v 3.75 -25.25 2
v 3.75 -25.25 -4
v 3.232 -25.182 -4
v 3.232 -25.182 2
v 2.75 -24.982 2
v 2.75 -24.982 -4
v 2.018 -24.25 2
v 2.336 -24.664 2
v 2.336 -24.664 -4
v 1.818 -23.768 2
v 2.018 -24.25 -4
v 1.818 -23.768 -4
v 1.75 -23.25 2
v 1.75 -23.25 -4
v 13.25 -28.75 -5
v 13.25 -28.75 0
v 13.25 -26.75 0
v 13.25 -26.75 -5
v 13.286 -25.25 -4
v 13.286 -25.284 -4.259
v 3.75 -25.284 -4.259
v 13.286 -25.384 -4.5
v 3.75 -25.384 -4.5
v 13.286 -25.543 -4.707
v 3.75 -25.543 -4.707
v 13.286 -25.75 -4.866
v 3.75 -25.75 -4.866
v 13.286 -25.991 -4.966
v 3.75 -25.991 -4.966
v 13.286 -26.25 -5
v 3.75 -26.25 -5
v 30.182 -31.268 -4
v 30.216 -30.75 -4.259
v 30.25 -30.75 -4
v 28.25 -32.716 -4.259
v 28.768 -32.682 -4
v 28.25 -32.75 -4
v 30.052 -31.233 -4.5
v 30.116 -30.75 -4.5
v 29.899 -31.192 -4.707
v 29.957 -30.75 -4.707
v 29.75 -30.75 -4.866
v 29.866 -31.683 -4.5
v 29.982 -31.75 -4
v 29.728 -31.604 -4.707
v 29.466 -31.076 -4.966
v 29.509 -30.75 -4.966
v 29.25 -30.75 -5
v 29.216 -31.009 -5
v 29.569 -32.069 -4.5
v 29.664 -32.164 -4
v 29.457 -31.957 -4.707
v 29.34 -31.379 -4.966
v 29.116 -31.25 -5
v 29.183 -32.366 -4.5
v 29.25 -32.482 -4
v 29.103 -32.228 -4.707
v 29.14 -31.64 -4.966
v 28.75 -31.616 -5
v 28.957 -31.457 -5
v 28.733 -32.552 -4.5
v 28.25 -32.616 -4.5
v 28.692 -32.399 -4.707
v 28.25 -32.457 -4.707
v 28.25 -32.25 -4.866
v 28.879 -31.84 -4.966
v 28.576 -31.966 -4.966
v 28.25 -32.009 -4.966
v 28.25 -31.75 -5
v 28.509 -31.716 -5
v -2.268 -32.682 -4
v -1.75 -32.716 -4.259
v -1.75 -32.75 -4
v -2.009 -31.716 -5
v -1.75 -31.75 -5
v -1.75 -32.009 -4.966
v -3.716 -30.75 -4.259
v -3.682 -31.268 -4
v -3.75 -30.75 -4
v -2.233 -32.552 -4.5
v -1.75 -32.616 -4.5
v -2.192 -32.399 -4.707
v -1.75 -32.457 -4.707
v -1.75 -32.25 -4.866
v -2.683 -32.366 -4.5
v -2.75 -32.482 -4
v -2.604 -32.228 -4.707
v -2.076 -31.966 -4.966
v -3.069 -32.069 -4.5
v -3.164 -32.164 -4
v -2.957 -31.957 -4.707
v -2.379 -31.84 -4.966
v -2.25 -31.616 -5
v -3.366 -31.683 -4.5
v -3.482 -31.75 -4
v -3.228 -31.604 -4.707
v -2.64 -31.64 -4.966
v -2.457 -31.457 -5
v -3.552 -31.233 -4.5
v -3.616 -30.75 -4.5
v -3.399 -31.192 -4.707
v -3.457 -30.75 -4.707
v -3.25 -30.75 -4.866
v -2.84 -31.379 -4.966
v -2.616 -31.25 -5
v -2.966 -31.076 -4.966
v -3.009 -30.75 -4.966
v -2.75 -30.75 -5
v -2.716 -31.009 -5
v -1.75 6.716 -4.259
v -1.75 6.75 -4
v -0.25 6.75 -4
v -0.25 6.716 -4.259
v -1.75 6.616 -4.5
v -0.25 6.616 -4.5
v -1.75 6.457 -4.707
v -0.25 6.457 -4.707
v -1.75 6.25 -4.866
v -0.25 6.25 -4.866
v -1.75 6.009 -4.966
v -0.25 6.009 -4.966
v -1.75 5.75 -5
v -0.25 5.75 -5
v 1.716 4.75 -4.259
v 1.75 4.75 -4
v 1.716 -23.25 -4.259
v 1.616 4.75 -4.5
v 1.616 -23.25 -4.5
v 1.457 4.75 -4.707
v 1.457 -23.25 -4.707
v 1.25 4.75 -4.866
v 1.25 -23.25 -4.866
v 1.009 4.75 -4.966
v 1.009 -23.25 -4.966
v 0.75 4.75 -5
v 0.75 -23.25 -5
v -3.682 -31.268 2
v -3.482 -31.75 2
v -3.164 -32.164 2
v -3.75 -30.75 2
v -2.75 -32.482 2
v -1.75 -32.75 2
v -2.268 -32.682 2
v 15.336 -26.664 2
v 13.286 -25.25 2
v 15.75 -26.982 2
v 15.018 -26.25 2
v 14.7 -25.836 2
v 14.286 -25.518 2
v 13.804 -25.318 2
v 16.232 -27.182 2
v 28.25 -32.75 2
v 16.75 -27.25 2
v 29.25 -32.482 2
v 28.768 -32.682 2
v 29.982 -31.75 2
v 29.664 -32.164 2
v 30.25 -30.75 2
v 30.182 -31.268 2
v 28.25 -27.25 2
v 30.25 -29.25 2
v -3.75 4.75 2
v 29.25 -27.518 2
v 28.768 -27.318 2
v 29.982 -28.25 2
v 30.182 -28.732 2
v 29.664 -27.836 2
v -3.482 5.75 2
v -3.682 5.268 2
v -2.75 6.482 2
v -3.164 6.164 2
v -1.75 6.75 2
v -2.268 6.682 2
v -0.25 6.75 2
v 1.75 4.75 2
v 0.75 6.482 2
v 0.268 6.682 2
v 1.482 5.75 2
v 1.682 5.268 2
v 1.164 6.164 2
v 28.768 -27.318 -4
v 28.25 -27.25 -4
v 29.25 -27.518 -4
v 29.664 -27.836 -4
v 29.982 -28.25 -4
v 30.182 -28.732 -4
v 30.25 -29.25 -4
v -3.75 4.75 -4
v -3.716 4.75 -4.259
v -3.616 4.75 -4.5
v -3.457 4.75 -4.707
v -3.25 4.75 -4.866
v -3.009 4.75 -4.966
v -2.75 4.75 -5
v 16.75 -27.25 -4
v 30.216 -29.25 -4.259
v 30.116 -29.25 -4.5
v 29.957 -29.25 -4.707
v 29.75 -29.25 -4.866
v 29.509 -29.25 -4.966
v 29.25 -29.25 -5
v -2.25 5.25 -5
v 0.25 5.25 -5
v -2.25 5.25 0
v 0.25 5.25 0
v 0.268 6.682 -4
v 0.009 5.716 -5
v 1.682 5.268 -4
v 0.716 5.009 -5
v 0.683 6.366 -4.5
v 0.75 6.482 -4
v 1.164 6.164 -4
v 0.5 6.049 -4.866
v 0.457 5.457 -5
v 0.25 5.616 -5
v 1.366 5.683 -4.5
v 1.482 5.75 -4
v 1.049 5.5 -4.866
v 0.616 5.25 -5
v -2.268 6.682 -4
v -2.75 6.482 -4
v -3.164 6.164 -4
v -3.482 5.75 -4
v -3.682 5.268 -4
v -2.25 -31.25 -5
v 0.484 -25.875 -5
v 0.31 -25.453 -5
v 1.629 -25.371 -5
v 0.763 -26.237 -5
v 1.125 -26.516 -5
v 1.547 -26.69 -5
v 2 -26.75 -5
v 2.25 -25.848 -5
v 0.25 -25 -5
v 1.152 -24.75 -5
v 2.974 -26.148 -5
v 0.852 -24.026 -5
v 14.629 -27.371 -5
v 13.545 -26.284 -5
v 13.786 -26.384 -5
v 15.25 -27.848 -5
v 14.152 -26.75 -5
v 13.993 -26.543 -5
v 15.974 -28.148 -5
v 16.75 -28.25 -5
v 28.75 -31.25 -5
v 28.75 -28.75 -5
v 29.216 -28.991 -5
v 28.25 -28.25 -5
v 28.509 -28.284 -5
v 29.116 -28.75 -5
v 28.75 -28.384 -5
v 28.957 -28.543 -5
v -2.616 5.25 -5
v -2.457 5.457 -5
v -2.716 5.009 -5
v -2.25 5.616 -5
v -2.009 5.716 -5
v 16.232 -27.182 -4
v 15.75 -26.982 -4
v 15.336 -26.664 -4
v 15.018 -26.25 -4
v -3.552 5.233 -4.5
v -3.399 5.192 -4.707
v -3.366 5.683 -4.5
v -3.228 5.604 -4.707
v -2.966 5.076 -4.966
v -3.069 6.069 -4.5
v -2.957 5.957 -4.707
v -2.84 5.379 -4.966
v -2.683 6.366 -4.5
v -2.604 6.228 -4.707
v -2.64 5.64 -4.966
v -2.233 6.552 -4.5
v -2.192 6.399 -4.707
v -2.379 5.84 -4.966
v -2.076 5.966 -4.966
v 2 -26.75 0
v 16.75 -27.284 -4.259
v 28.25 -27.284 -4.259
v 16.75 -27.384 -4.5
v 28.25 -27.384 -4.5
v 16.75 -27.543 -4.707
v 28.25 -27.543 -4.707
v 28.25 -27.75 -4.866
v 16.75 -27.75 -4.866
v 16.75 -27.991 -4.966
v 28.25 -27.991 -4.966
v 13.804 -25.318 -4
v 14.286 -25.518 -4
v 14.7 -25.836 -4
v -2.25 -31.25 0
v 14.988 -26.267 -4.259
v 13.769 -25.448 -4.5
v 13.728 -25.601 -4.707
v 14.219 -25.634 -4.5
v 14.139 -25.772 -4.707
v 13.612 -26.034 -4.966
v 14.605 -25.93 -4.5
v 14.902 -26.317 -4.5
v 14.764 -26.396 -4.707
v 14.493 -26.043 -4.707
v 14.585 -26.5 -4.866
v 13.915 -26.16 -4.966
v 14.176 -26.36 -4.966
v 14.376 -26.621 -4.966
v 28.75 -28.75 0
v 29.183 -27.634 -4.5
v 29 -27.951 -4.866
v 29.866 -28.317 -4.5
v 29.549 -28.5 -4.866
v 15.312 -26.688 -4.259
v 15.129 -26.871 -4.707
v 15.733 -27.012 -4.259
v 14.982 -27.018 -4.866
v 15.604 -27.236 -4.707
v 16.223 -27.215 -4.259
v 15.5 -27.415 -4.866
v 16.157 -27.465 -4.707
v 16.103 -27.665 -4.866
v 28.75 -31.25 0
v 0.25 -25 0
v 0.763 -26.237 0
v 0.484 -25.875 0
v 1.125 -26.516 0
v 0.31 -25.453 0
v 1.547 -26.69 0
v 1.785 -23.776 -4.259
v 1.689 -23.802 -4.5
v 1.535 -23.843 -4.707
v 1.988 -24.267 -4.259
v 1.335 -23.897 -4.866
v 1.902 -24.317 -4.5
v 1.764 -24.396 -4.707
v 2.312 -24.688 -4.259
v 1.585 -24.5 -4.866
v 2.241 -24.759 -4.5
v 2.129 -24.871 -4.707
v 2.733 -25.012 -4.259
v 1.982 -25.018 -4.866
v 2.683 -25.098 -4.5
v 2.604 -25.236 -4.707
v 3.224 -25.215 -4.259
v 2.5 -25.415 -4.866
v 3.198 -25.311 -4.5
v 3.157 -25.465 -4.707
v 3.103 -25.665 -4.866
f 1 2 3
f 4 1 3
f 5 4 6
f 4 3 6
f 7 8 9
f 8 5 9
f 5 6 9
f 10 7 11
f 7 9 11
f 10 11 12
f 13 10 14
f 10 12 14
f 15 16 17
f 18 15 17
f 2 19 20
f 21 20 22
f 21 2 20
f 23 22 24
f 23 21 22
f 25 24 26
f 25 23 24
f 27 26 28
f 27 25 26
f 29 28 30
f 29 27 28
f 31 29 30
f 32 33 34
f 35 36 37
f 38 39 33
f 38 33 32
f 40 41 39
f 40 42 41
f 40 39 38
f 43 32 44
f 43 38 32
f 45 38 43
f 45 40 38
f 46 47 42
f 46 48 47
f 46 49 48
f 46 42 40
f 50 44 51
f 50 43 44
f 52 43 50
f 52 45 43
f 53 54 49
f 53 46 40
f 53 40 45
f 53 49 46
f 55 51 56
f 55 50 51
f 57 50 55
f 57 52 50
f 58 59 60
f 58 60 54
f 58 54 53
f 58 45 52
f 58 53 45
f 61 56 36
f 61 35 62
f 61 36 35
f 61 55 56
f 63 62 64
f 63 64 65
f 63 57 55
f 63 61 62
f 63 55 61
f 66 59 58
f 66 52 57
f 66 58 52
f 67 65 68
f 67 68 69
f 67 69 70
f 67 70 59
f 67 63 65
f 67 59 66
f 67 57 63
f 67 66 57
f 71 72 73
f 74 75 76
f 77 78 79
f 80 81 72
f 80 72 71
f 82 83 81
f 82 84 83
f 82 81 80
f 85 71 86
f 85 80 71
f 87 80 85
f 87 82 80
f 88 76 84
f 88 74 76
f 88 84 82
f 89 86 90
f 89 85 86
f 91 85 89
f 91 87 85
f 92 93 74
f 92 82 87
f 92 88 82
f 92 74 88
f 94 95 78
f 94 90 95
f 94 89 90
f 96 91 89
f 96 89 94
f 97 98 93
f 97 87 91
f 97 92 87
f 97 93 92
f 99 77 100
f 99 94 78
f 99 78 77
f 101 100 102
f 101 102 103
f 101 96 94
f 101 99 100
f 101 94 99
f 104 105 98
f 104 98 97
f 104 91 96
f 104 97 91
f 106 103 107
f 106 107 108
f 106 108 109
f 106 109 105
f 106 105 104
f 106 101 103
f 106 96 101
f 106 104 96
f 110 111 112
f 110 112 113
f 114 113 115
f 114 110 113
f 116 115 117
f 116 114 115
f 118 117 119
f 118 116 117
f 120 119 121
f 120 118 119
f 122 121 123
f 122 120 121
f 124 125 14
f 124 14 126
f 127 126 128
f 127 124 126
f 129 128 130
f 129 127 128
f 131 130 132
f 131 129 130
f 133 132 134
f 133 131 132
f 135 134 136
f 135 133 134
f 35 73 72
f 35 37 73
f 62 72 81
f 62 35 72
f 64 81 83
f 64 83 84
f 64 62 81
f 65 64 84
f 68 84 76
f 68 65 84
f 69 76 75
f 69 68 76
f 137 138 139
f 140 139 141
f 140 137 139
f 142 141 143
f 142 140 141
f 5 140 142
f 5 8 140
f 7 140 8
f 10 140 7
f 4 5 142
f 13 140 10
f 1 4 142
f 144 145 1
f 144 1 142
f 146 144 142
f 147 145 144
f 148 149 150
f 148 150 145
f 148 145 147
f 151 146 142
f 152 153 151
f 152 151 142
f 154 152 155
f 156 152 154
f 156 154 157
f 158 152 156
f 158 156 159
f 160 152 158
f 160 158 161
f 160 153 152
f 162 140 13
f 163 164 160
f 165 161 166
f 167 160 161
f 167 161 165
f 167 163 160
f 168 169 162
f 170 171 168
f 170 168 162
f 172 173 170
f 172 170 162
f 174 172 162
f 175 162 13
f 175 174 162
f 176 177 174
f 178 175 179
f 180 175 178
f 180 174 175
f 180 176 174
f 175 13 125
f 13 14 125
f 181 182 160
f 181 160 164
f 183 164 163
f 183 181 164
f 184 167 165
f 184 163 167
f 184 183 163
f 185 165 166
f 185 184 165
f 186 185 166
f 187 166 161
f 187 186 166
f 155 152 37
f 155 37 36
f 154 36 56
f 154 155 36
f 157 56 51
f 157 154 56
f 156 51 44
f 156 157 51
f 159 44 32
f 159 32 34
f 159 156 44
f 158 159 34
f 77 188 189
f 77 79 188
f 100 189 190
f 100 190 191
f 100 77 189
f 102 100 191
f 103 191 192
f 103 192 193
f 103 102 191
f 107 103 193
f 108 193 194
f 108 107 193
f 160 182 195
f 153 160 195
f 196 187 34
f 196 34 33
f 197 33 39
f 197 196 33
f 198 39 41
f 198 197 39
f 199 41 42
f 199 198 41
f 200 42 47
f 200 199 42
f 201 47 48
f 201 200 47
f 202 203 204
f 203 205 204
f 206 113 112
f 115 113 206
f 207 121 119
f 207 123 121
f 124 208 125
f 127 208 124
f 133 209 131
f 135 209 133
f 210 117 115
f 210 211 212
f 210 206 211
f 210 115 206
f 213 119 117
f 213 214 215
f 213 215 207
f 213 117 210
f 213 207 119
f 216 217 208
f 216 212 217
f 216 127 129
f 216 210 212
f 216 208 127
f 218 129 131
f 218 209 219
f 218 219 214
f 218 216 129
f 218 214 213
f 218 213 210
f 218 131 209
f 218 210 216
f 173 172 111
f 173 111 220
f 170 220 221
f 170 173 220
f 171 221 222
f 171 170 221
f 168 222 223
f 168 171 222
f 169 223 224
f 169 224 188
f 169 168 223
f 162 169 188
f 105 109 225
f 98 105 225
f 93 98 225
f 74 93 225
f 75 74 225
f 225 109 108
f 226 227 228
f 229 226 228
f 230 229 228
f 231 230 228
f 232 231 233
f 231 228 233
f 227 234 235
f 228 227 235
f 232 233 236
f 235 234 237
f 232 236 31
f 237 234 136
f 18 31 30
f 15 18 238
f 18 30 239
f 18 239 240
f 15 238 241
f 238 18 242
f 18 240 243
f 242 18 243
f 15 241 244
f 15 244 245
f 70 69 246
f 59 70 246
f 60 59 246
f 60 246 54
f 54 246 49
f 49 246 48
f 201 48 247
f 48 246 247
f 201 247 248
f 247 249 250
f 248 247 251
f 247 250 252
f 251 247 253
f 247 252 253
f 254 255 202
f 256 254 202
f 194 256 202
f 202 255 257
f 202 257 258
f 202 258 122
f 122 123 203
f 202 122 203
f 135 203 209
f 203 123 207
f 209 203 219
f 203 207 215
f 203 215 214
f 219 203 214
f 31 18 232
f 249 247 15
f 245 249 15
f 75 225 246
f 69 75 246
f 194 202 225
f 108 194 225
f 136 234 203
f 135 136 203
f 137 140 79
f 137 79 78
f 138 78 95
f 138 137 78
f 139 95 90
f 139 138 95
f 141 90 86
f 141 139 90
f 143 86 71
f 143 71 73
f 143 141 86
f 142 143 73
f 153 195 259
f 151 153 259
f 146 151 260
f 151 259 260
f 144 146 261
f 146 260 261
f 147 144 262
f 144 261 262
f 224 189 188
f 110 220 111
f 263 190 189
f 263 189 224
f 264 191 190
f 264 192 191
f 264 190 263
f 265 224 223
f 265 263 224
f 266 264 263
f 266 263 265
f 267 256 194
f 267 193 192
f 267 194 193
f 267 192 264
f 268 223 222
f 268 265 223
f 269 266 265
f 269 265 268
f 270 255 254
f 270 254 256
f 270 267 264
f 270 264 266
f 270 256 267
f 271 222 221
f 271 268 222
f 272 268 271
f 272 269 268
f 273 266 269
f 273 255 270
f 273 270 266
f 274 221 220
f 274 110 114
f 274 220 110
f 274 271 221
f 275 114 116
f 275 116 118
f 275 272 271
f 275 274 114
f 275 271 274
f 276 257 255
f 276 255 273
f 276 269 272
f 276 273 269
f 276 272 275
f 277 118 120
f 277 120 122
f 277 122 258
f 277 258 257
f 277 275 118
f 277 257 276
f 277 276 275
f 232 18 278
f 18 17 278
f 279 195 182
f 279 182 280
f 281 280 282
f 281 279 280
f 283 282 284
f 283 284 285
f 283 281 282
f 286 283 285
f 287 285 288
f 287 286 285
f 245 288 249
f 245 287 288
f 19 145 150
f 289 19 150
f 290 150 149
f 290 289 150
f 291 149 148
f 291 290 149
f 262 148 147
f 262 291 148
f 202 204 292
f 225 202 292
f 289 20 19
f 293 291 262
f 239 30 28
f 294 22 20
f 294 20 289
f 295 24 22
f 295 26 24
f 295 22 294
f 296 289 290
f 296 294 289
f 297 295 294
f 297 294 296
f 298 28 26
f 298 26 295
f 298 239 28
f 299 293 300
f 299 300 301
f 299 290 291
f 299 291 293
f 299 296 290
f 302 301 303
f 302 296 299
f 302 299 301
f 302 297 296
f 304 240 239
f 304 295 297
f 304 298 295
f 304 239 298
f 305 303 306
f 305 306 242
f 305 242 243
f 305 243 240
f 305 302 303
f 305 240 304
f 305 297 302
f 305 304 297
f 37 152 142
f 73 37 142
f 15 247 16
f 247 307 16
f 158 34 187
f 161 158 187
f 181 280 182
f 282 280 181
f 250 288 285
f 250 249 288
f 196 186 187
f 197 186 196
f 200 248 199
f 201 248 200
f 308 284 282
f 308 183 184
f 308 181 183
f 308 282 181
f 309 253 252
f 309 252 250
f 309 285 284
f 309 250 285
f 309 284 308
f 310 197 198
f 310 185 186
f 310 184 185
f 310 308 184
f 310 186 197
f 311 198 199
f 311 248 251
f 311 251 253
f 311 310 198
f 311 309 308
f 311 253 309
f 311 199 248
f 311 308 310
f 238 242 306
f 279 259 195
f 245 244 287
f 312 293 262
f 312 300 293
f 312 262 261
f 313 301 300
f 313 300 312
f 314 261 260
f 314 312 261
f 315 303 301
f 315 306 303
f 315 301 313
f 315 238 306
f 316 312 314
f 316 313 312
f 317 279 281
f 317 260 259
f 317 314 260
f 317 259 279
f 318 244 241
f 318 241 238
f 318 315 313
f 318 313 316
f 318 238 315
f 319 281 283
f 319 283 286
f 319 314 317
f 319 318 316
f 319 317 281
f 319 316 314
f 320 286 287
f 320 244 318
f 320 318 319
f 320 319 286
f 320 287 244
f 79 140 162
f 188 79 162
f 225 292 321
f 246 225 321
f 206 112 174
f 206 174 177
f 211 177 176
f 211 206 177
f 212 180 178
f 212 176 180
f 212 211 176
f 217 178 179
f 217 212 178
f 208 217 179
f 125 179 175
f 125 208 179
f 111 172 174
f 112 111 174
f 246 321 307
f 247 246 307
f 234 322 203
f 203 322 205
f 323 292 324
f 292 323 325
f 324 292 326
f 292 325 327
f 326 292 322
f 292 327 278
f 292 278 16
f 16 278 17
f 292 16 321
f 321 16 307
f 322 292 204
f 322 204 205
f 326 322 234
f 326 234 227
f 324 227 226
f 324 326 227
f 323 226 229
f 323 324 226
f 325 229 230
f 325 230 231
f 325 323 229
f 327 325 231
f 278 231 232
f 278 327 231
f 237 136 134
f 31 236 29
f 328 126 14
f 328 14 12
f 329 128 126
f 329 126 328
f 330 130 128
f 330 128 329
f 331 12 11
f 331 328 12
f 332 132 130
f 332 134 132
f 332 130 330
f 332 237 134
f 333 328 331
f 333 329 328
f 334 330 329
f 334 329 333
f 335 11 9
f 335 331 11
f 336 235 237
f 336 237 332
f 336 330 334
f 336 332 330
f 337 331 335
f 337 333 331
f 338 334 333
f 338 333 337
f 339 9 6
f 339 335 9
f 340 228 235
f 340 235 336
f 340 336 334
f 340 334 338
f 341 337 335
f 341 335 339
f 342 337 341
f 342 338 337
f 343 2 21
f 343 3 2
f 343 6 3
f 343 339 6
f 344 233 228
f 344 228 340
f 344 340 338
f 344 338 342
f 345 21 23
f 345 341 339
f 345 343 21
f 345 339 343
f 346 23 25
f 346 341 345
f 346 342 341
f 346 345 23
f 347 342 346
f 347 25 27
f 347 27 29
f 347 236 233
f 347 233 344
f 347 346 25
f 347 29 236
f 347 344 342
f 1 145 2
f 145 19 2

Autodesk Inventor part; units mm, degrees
ref_plane "YZ Plane" through (0, 0, 0) normal (1, 0, 0) x (0, 1, 0)
ref_plane "XZ Plane" through (0, 0, 0) normal (0, 1, 0) x (-1, 0, 0)
ref_plane "XY Plane" through (0, 0, 0) normal (0, 0, 1) x (1, 0, 0)
sketch "Skizze1" plane through (0, 0, 0) normal (0, 0, 1) x (1, 0, 0)
  line L0 (-2, -29) -> (-2, -31) construction
  line L1 (0, -31) -> (-2, -31) construction
  line L2 (-2, -29) -> (0, -29) construction
  line L3 (0, -31) -> (26.4999, -31) construction
  line L4 (28.4999, -31) -> (26.4999, -31) construction
  line L5 (26.4999, -29) -> (28.4999, -29) construction
  line L6 (28.4999, -31) -> (28.4999, -29) construction
  line L7 (26.4999, -29) -> (0, -29) construction
  line L8 (13, -27) -> (13, -29) construction
  line L9 (13, -27) -> (2, -27) construction
  arc A0 (0, -25) -> (2, -27) centre (2, -25) ccw construction
  arc A1 (-2, -25) -> (2, -29) centre (2, -25) ccw construction
  line L10 (-2, 0) -> (-2, -25) construction
  line L11 (0, -25) -> (0, 0) construction
  line L12 (-2, 0) -> (-2, 5) construction
  line L13 (0, 5) -> (0, 0) construction
  line L14 (0, 5) -> (-2, 5) construction
  line L15 (28.4999, -31) -> (-2, -31) construction
  line L16 (-2, -31) -> (-2, 5) construction
  line L17 (-2, 5) -> (0, 5) construction
  line L18 (0, 5) -> (0, -25) construction
  arc A2 (0, -25) -> (2, -27) centre (2, -25) ccw construction
  line L19 (2, -27) -> (13, -27) construction
  line L20 (13, -27) -> (13, -29) construction
  line L21 (13, -29) -> (28.4999, -29) construction
  line L22 (28.4999, -31) -> (28.4999, -29) construction
  line L23 (-2.25, 5.25) -> (-2.25, -31.25)
  line L24 (-2.25, -31.25) -> (28.7499, -31.25)
  line L25 (28.7499, -31.25) -> (28.7499, -28.75)
  line L26 (28.7499, -28.75) -> (13.25, -28.75)
  line L27 (13.25, -28.75) -> (13.25, -26.75)
  line L28 (13.25, -26.75) -> (2, -26.75)
  arc A3 (0.25, -25) -> (2, -26.75) centre (2, -25) ccw
  line L29 (0.25, -25) -> (0.25, 5.25)
  line L30 (0.25, 5.25) -> (-2.25, 5.25)
  line L31 (-3.75, -30.75) -> (-3.75, 4.75)
  line L32 (-1.75, 6.75) -> (-0.25, 6.75)
  line L33 (1.75, 4.75) -> (1.75, -23.25)
  arc A4 (1.75, -25) -> (2, -25.25) centre (2, -25) ccw
  line L34 (3.75, -25.25) -> (13.2859, -25.25)
  line L35 (14.75, -25.25) -> (14.75, -25.25)
  line L36 (16.75, -27.25) -> (28.2499, -27.25)
  line L37 (30.2499, -29.25) -> (30.2499, -30.75)
  line L38 (28.2499, -32.75) -> (-1.75, -32.75)
  arc A5 (28.2499, -32.75) -> (30.2499, -30.75) centre (28.2499, -30.75) ccw
  arc A6 (30.2499, -29.25) -> (28.2499, -27.25) centre (28.2499, -29.25) ccw
  arc A7 (-3.75, -30.75) -> (-1.75, -32.75) centre (-1.75, -30.75) ccw
  arc A8 (15.0179, -26.25) -> (16.75, -27.25) centre (16.75, -25.25) ccw
  arc A9 (15.0179, -26.25) -> (13.2859, -25.25) centre (13.2859, -27.25) ccw
  arc A10 (1.75, -23.25) -> (3.75, -25.25) centre (3.75, -23.25) ccw
  arc A11 (1.75, 4.75) -> (-0.25, 6.75) centre (-0.25, 4.75) ccw
  arc A12 (-1.75, 6.75) -> (-3.75, 4.75) centre (-1.75, 4.75) ccw
  dimension "d0" = 0.25
  dimension "d1" = 1.5
  dimension "d2" = 2
  dimension "d3" = 2
extrude "Extrusion1" add sketch "Skizze1" against normal blind 5
fillet "Rundung1" radius 1 15 edges at (-3.1642, -32.1642, -5) (-3.75, -13, -5) (-3.1642, 6.1642, -5) (-1, 6.75, -5) (1.1642, 6.1642, -5) (1.75, -9.25, -5) (2.3358, -24.6642, -5) (8.5179, -25.25, -5) (14.2859, -25.5179, -5) (15.75, -26.9821, -5) (22.5, -27.25, -5) (29.6641, -27.8358, -5) (30.2499, -30, -5) (29.6641, -32.1642, -5) (13.25, -32.75, -5)
sketch "Skizze2" plane through (0, 0, 0) normal (0, 0, 1) x (1, 0, 0)
  line L0 (28.7499, -31.25) -> (-2.25, -31.25) projected
  line L1 (-2.25, -31.25) -> (-2.25, 5.25) projected
  line L2 (-2.25, 5.25) -> (0.25, 5.25) projected
  line L3 (0.25, 5.25) -> (0.25, -25) projected
  arc A0 (0.25, -25) -> (2, -26.75) centre (2, -25) ccw projected
  line L4 (2, -26.75) -> (13.25, -26.75) projected
  line L5 (13.25, -26.75) -> (13.25, -28.75) projected
  line L6 (13.25, -28.75) -> (28.7499, -28.75) projected
  line L7 (28.7499, -28.75) -> (28.7499, -31.25) projected
  line L8 (30.2499, -30.75) -> (30.2499, -29.25) projected
  arc A1 (30.2499, -29.25) -> (28.2499, -27.25) centre (28.2499, -29.25) ccw projected
  line L9 (28.2499, -27.25) -> (16.75, -27.25) projected
  arc A2 (15.0179, -26.25) -> (16.75, -27.25) centre (16.75, -25.25) ccw projected
  arc A3 (15.0179, -26.25) -> (13.2859, -25.25) centre (13.2859, -27.25) ccw projected
  line L10 (13.2859, -25.25) -> (3.75, -25.25) projected
  arc A4 (1.75, -23.25) -> (3.75, -25.25) centre (3.75, -23.25) ccw projected
  line L11 (1.75, -23.25) -> (1.75, 4.75) projected
  arc A5 (1.75, 4.75) -> (-0.25, 6.75) centre (-0.25, 4.75) ccw projected
  line L12 (-0.25, 6.75) -> (-1.75, 6.75) projected
  arc A6 (-1.75, 6.75) -> (-3.75, 4.75) centre (-1.75, 4.75) ccw projected
  line L13 (-3.75, 4.75) -> (-3.75, -30.75) projected
  arc A7 (-3.75, -30.75) -> (-1.75, -32.75) centre (-1.75, -30.75) ccw projected
  line L14 (-1.75, -32.75) -> (28.2499, -32.75) projected
  arc A8 (28.2499, -32.75) -> (30.2499, -30.75) centre (28.2499, -30.75) ccw projected
  point P0 (0, 0)
extrude "Extrusion2" add sketch "Skizze2" along normal blind 2 contours L0 L1 L2 L3 A0 L4 L5 L6 L7 | A8 L14 A7 L13 A6 L12 A5 L11 A4 L10 A3 A2 L9 A1 L8
properties part number "Stand_Vorne"
